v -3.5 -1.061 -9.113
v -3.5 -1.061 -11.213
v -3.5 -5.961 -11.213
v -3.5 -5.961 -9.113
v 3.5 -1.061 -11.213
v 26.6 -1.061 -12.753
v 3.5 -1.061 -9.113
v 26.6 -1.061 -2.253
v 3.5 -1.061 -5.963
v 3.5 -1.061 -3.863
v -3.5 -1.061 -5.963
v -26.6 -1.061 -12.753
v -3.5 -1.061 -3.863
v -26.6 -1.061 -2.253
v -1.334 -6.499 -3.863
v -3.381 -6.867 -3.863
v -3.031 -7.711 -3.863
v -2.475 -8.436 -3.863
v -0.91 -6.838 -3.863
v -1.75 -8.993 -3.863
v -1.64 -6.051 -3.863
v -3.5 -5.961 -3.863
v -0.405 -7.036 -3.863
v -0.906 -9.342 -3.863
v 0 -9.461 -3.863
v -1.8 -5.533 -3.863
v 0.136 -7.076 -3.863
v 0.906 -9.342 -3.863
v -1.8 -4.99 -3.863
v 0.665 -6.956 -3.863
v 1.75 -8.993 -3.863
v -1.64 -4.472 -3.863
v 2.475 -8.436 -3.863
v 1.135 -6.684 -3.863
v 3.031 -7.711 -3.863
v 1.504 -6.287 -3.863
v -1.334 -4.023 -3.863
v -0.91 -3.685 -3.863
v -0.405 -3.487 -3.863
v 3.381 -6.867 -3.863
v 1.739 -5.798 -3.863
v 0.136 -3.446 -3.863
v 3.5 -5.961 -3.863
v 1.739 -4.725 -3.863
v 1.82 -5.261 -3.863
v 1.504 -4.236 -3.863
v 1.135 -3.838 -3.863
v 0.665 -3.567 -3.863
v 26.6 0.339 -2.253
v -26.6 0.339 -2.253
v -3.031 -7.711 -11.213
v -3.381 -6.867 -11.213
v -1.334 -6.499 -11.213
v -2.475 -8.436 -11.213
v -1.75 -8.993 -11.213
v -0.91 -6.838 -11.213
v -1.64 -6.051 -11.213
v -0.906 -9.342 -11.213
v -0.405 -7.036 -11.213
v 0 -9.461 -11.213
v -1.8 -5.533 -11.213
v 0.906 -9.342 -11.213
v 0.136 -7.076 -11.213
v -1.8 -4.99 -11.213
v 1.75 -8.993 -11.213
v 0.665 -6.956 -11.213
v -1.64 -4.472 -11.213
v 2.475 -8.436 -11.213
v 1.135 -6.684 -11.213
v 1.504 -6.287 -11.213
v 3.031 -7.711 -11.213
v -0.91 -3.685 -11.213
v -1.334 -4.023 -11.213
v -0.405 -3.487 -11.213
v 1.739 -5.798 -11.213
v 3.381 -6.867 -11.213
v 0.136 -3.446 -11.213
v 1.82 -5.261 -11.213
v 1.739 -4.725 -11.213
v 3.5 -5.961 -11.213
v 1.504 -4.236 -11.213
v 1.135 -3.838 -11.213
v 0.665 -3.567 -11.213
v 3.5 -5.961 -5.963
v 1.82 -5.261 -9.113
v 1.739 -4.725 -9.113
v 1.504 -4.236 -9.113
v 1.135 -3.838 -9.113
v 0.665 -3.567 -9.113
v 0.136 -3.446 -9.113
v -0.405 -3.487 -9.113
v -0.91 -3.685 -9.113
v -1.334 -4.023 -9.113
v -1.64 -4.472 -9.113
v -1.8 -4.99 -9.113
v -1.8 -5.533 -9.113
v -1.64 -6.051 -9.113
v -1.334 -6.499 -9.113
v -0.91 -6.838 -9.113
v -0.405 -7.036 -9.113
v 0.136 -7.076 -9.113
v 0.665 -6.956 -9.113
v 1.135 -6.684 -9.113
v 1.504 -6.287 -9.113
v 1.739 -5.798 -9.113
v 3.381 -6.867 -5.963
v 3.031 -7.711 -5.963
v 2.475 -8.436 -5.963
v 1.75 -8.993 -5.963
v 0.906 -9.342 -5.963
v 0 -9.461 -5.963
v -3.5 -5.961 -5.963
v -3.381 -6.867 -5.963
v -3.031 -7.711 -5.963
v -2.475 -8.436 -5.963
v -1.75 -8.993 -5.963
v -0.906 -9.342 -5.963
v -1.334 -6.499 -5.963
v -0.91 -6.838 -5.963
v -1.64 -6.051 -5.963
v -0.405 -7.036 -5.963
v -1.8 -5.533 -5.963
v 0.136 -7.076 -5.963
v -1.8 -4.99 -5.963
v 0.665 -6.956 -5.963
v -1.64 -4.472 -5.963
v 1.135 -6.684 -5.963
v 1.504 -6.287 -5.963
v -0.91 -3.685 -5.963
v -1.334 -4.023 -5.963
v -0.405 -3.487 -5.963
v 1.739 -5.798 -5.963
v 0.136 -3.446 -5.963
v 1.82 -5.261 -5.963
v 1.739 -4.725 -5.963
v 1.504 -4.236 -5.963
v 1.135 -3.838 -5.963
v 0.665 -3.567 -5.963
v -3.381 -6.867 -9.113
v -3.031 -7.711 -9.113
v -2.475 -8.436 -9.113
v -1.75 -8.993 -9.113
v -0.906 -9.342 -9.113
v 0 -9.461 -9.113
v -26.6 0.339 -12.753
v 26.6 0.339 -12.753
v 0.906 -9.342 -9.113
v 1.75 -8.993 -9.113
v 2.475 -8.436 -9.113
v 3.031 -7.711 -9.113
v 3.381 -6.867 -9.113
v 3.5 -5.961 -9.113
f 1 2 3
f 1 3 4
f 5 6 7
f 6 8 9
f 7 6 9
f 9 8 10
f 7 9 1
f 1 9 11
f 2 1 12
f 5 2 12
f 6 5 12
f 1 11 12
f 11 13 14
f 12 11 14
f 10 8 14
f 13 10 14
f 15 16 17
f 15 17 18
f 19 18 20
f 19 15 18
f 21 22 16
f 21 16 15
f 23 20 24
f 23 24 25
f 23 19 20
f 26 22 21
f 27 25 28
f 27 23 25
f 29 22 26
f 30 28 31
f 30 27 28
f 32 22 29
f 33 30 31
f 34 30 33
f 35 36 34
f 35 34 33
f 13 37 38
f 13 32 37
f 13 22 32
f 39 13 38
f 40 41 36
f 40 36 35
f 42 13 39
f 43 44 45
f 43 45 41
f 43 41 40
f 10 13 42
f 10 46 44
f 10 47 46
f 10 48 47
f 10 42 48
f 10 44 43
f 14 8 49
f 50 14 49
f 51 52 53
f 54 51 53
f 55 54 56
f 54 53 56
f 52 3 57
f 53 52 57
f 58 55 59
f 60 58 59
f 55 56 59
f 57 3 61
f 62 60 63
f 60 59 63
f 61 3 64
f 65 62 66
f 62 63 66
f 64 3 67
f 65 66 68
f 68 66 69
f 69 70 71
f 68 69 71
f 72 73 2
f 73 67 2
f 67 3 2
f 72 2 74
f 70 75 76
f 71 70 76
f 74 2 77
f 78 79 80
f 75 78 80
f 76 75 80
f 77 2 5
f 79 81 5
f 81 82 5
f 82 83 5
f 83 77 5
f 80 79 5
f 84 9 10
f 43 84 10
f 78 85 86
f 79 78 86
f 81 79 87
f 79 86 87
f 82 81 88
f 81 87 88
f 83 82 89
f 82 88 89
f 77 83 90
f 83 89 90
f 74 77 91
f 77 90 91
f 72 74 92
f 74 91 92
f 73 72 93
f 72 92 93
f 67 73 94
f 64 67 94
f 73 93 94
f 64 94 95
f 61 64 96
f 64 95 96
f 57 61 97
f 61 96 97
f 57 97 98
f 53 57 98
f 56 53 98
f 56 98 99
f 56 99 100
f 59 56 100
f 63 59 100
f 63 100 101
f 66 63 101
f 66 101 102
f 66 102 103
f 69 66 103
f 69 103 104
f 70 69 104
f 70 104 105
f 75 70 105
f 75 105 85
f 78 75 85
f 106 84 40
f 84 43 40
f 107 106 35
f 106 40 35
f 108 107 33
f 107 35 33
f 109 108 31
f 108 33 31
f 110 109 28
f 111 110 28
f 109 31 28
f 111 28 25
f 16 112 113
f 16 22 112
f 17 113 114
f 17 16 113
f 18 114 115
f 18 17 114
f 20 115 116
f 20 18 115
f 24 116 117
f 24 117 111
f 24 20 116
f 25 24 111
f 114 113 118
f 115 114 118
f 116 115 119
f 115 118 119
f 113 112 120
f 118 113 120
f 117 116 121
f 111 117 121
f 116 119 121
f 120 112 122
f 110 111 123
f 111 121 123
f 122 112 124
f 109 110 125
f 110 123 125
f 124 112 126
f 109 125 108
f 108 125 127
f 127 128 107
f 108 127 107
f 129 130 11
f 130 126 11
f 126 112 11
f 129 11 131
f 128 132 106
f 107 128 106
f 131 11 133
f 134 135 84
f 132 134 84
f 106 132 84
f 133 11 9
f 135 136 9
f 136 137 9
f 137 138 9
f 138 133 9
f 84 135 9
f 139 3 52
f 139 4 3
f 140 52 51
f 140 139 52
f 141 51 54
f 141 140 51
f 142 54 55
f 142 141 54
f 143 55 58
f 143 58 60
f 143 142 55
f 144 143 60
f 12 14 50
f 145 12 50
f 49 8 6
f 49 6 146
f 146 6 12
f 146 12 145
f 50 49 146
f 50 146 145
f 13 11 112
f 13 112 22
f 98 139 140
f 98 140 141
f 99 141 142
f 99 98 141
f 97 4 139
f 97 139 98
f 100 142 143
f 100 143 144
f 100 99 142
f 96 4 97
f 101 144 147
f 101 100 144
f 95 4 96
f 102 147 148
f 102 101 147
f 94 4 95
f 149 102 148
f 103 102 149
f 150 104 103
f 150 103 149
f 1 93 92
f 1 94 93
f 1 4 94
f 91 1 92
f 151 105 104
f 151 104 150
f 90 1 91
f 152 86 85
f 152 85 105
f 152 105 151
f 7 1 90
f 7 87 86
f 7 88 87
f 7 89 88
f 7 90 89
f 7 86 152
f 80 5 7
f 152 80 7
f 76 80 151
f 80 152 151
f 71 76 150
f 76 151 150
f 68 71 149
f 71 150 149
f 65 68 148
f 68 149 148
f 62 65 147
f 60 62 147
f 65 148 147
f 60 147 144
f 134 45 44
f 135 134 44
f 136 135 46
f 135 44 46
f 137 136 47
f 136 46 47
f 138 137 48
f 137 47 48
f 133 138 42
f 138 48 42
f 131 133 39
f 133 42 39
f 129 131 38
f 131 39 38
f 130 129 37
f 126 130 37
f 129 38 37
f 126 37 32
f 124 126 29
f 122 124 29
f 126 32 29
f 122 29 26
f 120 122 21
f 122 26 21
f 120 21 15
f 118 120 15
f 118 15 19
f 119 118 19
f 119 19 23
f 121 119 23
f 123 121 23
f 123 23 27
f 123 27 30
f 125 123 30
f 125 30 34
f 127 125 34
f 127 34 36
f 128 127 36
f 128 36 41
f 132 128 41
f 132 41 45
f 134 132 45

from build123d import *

# Parameters (mm, degrees)
SKETCH1_W           = 2
SKETCH1_H           = 76
BOSS_EXTRUDE1_DEPTH = 15
SKETCH2_W           = 10
SKETCH2_H           = 3
BOSS_EXTRUDE2_DEPTH = 12
SKETCH3_R           = 2.6
CUT_EXTRUDE1_DEPTH  = 12
FILLET1_R           = 5
SCALE1_SCALE        = 0.7


with BuildPart() as part:
    # Sketch1 → Boss-Extrude1 (new body)
    with BuildSketch(Plane(origin=(0, 0, 0), x_dir=(0, 1, 0), z_dir=(0, 0, 1))):
        Rectangle(SKETCH1_W, SKETCH1_H)
    extrude(amount=-BOSS_EXTRUDE1_DEPTH)

    # Sketch2 → Boss-Extrude2 (add)
    with BuildSketch(Plane.XZ.offset(1)):
        with Locations((0, -3.8)):
            Rectangle(SKETCH2_W, SKETCH2_H)
        with Locations((0, -11.3)):
            Rectangle(SKETCH2_W, SKETCH2_H)
    extrude(amount=BOSS_EXTRUDE2_DEPTH)

    # Sketch3 → Cut-Extrude1 (cut)
    with BuildSketch(Plane.XY.offset(-2.3)):
        with Locations((0, -7)):
            Circle(SKETCH3_R)
    extrude(amount=-CUT_EXTRUDE1_DEPTH, mode=Mode.SUBTRACT)

    # Fillet1
    fillet1_edges = [part.edges().sort_by_distance(p)[0] for p in [
        (-5, -13, -11.3),
        (5, -13, -11.3),
        (5, -13, -3.8),
        (-5, -13, -3.8),
    ]]
    fillet(fillet1_edges, radius=FILLET1_R - 0.0001)  # a hair under: the kernel refuses the full size


with BuildPart() as part_1:
    # Scale1: scaled about (0, -1.204695158, -7.509404587)
    add(part.part.scale(SCALE1_SCALE).moved(Location((0, -0.361408547, -2.252821376))))


solid = part_1.part
